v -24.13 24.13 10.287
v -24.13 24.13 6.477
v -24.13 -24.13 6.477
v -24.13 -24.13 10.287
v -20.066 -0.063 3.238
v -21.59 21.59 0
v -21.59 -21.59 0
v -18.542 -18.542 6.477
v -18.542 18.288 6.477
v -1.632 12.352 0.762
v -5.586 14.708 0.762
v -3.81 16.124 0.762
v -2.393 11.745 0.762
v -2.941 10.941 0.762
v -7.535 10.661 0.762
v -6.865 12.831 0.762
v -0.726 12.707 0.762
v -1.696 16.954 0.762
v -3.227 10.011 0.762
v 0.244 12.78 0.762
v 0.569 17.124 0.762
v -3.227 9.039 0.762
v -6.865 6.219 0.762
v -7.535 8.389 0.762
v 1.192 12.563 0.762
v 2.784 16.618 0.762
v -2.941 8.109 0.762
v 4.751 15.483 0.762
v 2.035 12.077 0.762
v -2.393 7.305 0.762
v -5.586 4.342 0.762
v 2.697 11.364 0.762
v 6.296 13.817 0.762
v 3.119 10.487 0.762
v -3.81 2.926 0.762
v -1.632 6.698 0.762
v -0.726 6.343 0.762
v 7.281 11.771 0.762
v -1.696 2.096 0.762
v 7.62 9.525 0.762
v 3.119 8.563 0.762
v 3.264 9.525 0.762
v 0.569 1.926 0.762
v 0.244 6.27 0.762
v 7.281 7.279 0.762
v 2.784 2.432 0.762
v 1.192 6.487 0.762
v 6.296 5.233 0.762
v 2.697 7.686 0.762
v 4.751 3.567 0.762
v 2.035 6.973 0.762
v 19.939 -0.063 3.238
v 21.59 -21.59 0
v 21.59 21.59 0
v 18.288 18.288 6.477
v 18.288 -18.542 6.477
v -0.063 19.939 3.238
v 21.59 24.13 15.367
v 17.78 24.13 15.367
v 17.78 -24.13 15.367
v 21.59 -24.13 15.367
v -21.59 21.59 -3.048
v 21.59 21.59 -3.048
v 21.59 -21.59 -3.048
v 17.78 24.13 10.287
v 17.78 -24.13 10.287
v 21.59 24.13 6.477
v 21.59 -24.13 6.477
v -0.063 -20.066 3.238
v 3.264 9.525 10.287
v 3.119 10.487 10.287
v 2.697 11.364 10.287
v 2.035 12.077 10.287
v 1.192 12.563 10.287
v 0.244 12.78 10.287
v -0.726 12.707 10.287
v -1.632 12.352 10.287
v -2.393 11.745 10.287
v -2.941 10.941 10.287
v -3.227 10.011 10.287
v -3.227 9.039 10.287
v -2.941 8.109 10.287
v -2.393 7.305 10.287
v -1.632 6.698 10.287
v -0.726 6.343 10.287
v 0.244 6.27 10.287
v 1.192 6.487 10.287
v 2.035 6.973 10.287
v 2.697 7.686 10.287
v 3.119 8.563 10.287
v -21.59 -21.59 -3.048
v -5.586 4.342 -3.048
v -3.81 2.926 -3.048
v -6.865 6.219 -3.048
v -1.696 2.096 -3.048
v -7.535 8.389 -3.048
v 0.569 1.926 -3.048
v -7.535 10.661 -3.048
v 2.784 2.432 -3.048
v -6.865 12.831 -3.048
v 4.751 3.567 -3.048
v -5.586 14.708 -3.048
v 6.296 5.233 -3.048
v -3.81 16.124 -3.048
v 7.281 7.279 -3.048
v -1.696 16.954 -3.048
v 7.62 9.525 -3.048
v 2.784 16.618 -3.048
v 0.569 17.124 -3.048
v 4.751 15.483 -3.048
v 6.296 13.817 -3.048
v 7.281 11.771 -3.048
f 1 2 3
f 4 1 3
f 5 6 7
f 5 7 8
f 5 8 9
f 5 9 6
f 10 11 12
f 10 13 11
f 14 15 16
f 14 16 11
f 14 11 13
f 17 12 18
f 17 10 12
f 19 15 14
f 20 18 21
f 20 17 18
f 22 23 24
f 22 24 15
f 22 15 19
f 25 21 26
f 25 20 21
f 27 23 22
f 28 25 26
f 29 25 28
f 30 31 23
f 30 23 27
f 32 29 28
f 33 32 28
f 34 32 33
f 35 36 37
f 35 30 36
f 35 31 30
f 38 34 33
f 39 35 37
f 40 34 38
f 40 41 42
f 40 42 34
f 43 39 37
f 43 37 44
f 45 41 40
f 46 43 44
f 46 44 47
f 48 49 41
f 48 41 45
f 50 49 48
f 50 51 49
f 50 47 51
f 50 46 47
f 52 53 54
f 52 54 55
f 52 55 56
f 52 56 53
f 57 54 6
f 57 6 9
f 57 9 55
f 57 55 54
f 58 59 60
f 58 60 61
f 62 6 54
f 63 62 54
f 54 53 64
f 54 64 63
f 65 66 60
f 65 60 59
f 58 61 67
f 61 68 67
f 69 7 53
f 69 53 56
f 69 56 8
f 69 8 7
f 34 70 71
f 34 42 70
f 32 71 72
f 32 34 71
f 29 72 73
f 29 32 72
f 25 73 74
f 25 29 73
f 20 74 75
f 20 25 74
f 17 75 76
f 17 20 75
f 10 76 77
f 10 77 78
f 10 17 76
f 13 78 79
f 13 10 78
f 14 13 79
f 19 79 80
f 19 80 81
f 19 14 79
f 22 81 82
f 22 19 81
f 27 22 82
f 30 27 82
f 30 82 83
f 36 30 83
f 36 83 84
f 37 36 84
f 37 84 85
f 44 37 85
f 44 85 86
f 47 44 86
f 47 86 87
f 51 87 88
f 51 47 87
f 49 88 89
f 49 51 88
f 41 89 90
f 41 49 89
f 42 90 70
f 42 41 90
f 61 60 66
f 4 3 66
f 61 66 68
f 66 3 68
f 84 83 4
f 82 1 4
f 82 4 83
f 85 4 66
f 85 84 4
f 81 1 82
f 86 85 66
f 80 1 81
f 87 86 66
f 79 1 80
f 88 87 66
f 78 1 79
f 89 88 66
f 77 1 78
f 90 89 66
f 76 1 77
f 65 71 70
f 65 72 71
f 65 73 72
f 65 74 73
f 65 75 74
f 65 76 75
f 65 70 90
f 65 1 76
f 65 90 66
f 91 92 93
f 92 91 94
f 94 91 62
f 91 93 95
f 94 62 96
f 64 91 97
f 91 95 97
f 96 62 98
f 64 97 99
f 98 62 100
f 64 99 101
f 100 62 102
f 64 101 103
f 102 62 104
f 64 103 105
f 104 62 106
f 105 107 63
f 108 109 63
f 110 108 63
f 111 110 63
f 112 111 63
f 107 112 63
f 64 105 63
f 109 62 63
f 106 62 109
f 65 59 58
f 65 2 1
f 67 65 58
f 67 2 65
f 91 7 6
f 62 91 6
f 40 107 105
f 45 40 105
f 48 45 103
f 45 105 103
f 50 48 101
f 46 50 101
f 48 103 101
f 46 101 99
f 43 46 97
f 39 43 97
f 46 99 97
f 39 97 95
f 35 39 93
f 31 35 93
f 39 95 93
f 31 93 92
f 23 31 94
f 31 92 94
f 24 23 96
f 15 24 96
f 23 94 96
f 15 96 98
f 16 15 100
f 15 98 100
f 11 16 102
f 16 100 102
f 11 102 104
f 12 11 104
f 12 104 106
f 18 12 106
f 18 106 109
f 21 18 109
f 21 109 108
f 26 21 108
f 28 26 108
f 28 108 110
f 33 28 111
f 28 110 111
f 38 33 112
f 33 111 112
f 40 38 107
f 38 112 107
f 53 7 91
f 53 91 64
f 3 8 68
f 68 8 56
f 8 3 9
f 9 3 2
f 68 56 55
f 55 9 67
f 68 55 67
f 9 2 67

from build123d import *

# Parameters (mm, degrees)
F0_W      = 43.18
F0_H      = 43.18
F3_DEPTH  = 3.048
F3_FACE_W = 43.18
F3_FACE_H = 43.18
F2_W      = 36.83
F2_H      = 36.83
F5_R      = 7.62
F6_DEPTH  = 3.81
F7_R      = 3.2639
F8_DEPTH  = 25.4
F9_W      = 36.83
F9_H      = 36.83
F9_W_2    = 43.18
F9_H_2    = 2.54
F9_R      = 3.2639
F10_DEPTH = 3.81
F11_W     = 3.81
F11_H     = 48.26
F12_DEPTH = 5.08


# Not quite as in the source:
# - a feature names something its author has since deleted; it is built from what else it names


with BuildPart() as f3:
    # F0 (on Top) → F3 (new body)
    with BuildSketch(Plane.XY):
        Rectangle(F0_W, F0_H)
    extrude(amount=-F3_DEPTH)

    # F3_face (on face) → F4 section 0
    with BuildSketch(Plane.XY):
        Rectangle(F3_FACE_W, F3_FACE_H)
    # F2 (on offset) → F4 section 1
    with BuildSketch(Plane.XY.offset(6.477)):
        with Locations((-0.127, -0.127)):
            Rectangle(F2_W, F2_H)
    loft()

    # F5 (on face) → F6 (cut)
    with BuildSketch(Plane(origin=(0, 0, -3.048), x_dir=(1, 0, 0), z_dir=(0, 0, -1))):
        with Locations((0, -9.525)):
            Circle(F5_R)
    extrude(amount=-F6_DEPTH, mode=Mode.SUBTRACT)

    # F7 (on face) → F8 (cut)
    with BuildSketch(Plane(origin=(0, 0, 0.762), x_dir=(1, 0, 0), z_dir=(0, 0, -1))):
        with Locations((0, -9.525)):
            Circle(F7_R)
    extrude(amount=-F8_DEPTH, mode=Mode.SUBTRACT)

    # F9 (on face) → F10 (join)
    with BuildSketch(Plane.XY.offset(6.477)):
        Polygon((-21.59, 24.13), (-21.59, 21.59), (-21.59, -21.59), (21.59, -21.59), (21.59, 21.59), (21.59, 24.13), align=None)
        with Locations((-0.127, -0.127)):
            Rectangle(F9_W, F9_H, mode=Mode.SUBTRACT)
        Polygon((-21.59, -21.59), (-21.59, 21.59), (-21.59, 24.13), (-24.13, 24.13), (-24.13, -24.13), (-21.59, -24.13), align=None)
        with Locations((0, -22.86)):
            Rectangle(F9_W_2, F9_H_2)
        with Locations((-0.127, -0.127)):
            Rectangle(F9_W, F9_H)
        with Locations((0, 9.525)):
            Circle(F9_R, mode=Mode.SUBTRACT)
    extrude(amount=F10_DEPTH)

    # F11 (on face) → F12 (join)
    with BuildSketch(Plane.XY.offset(10.287)):
        with Locations((19.685, 0)):
            Rectangle(F11_W, F11_H)
    extrude(amount=F12_DEPTH)


solid = f3.part
